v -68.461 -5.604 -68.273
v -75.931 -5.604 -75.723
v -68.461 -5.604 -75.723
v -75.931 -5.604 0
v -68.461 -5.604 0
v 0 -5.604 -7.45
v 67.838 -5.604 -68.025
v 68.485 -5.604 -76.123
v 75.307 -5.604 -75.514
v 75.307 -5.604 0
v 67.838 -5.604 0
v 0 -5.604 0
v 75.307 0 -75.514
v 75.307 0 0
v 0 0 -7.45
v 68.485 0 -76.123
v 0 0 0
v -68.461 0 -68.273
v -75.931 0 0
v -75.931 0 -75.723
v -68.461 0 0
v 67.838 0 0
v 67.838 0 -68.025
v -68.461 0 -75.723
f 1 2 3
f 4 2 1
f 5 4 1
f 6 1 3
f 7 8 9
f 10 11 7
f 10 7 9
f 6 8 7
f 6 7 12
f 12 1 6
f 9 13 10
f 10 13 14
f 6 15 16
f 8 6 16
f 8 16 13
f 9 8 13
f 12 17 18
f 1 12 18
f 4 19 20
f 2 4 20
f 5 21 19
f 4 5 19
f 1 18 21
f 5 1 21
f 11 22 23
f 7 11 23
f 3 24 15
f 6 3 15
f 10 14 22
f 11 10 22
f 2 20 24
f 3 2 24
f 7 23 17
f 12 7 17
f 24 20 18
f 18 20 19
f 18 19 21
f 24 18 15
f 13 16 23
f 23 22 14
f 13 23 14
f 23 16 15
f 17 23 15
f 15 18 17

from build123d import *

# Parameters (mm, degrees)
F1_DEPTH = 5.603792


with BuildPart() as f1:
    # F0 (on Front) → F1 (new body)
    with BuildSketch(Plane.XZ):
        Polygon((0, -7.449928), (0, 0), (-68.460882, -68.272778), (-75.931335, -75.722706), (-68.460882, -75.722706), align=None)
        Polygon((75.306922, 0), (67.83846, 0), (67.83846, -68.025367), (75.306922, -75.514406), align=None)
        Polygon((-75.931335, -75.722706), (-68.460882, -68.272778), (-68.460882, 0), (-75.931335, 0), align=None)
        Polygon((67.83846, -68.025367), (0, 0), (0, -7.449928), (68.484643, -76.123258), (75.306922, -75.514406), align=None)
    extrude(amount=F1_DEPTH)


solid = f1.part
